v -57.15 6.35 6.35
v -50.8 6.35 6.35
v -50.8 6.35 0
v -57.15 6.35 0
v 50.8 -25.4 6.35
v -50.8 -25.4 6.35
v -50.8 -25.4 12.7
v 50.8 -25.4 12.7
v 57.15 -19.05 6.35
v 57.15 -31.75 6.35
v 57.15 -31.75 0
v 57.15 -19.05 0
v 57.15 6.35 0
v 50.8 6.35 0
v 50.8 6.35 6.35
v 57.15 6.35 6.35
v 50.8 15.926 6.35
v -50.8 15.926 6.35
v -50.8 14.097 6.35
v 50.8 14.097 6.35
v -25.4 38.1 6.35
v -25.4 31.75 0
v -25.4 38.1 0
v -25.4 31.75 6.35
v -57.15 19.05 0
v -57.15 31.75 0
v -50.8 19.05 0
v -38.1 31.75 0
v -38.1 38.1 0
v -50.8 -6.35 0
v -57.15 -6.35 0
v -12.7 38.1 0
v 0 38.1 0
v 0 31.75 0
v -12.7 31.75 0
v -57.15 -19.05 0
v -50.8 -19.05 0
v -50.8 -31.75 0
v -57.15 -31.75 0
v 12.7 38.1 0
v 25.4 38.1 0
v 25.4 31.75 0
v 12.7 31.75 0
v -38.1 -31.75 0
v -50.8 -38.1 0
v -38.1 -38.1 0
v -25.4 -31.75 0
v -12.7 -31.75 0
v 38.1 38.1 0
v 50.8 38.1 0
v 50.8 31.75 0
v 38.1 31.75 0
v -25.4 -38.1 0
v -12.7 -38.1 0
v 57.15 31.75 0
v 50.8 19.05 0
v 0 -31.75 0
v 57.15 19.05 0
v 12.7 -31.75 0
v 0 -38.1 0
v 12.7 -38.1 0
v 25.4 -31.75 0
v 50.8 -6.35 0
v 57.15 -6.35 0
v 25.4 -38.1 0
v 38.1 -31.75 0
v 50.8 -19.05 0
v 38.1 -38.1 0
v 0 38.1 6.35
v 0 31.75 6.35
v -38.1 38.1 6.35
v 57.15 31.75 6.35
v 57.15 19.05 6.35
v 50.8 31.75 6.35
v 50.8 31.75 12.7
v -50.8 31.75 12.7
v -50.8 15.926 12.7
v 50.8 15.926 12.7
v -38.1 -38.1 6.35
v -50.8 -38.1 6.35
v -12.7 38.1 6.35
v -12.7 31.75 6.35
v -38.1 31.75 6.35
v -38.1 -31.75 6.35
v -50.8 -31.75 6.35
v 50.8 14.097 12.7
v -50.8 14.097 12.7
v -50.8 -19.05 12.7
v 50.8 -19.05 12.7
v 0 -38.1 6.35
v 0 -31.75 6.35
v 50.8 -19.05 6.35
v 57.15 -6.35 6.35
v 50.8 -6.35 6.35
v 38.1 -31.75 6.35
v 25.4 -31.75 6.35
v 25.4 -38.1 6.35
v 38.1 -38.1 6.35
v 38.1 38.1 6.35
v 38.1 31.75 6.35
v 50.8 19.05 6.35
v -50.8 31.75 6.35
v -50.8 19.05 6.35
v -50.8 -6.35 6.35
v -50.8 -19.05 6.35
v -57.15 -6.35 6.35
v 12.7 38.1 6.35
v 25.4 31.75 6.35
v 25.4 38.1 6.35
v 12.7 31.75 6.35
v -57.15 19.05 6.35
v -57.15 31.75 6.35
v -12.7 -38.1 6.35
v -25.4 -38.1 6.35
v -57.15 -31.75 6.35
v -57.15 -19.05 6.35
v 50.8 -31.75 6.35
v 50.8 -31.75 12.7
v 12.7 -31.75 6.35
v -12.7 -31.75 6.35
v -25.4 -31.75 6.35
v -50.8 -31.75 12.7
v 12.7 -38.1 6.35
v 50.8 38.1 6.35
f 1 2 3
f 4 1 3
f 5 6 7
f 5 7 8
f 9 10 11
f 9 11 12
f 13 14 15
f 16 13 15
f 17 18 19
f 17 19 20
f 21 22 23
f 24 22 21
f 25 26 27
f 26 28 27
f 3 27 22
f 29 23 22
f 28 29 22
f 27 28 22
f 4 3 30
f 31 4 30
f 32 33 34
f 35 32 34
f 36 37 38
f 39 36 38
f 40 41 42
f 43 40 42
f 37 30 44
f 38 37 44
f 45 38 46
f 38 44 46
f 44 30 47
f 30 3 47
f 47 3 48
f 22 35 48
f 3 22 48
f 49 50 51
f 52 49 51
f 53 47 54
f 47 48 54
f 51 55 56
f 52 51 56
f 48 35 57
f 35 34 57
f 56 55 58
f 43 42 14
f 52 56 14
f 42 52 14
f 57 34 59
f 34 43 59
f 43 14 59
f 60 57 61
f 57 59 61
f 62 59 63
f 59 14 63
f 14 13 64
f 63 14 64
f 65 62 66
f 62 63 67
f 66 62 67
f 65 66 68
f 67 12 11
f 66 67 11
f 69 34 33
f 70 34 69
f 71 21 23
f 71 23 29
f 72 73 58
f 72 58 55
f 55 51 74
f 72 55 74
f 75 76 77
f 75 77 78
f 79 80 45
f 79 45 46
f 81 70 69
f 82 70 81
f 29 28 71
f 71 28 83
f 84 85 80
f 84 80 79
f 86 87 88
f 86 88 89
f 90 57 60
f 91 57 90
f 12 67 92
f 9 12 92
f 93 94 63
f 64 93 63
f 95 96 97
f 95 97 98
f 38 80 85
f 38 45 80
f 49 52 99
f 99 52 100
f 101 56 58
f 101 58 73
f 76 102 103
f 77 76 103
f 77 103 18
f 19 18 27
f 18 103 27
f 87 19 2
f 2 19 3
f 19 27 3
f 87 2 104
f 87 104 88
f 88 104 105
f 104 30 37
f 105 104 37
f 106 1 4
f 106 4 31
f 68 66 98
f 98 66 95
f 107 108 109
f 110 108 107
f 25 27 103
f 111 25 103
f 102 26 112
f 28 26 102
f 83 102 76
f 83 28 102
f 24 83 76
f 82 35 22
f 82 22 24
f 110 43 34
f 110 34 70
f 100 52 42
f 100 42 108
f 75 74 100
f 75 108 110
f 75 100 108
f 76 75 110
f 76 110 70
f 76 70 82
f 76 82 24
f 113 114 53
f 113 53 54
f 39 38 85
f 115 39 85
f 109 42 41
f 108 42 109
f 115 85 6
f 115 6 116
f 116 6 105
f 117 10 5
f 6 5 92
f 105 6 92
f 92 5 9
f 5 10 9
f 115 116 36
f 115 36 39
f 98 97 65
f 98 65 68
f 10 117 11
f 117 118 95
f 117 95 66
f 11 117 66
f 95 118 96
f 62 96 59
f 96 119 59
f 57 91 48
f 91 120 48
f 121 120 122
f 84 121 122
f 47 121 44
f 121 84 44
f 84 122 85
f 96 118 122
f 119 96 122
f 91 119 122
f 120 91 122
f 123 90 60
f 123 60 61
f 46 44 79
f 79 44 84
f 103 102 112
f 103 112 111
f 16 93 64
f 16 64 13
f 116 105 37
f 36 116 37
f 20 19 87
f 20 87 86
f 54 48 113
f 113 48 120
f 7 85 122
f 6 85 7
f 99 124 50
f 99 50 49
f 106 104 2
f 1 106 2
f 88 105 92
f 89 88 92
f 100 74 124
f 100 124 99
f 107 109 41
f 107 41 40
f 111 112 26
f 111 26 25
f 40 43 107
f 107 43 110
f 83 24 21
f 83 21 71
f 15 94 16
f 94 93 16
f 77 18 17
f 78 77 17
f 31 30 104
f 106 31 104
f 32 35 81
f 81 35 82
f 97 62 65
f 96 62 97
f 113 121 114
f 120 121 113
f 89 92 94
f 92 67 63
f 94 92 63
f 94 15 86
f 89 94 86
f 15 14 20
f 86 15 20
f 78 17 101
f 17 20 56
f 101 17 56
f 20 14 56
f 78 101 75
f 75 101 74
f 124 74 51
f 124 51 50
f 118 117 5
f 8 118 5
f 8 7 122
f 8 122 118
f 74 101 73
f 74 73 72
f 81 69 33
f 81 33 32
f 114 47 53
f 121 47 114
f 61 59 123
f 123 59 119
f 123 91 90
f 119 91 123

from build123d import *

# Parameters (mm, degrees)
F0_W      = 101.6
F0_H      = 63.5
F1_DEPTH  = 6.35
F2_W      = 101.6
F2_H      = 6.35
F3_DEPTH  = 6.35
F4_W      = 101.6
F4_H      = 20.32
F5_DEPTH  = 6.35
F6_W      = 101.6
F6_H      = 8.8265
F7_DEPTH  = 6.35
F8_W      = 12.7
F8_H      = 6.35
F9_DEPTH  = 6.35
F10_W     = 12.7
F10_H     = 6.35
F11_DEPTH = 6.35
F12_W     = 101.6
F12_H     = 6.9977
F13_DEPTH = 6.35
F14_W     = 12.7
F14_H     = 6.35
F15_DEPTH = 6.35
F16_W     = 12.7
F16_H     = 6.35
F17_DEPTH = 6.35
F19_DEPTH = 6.35


with BuildPart() as f1:
    # F0 (on Top) → F1 (new body)
    with BuildSketch(Plane.XY):
        Rectangle(F0_W, F0_H)
    extrude(amount=F1_DEPTH)

    # F2 (on face) → F3 (join)
    with BuildSketch(Plane.XY.offset(6.35)):
        with Locations((0, -28.575)):
            Rectangle(F2_W, F2_H)
    extrude(amount=F3_DEPTH)

    # F4 (on face) → F5 (join)
    with BuildSketch(Plane.XY.offset(6.35)):
        with Locations((0, 3.937)):
            Rectangle(F4_W, F4_H)
    extrude(amount=F5_DEPTH)

    # F6 (on face) → F7 (join)
    with BuildSketch(Plane.XY.offset(6.35)):
        with Locations((0, 27.33675)):
            Rectangle(F6_W, F6_H)
    extrude(amount=F7_DEPTH)

    # F8 (on face) → F9 (join)
    with BuildSketch(Plane.XZ.offset(31.75)):
        with Locations((-44.45, 3.175)):
            Rectangle(F8_W, F8_H)
        with Locations((-19.05, 3.175)):
            Rectangle(F8_W, F8_H)
        with Locations((6.35, 3.175)):
            Rectangle(F8_W, F8_H)
        with Locations((31.75, 3.175)):
            Rectangle(F8_W, F8_H)
    extrude(amount=F9_DEPTH)

    # F10 (on face) → F11 (join)
    with BuildSketch(Plane(origin=(0, 31.75, 0), x_dir=(-1, 0, 0), z_dir=(0, 1, 0))):
        with Locations((-44.45, 3.175)):
            Rectangle(F10_W, F10_H)
        with Locations((-19.05, 3.175)):
            Rectangle(F10_W, F10_H)
        with Locations((6.35, 3.175)):
            Rectangle(F10_W, F10_H)
        with Locations((31.75, 3.175)):
            Rectangle(F10_W, F10_H)
    extrude(amount=F11_DEPTH)

    # F12 (on face) → F13 (join)
    with BuildSketch(Plane.XY.offset(6.35)):
        with Locations((0, 19.42465)):
            Rectangle(F12_W, F12_H)
    extrude(amount=F13_DEPTH)

    # F14 (on face) → F15 (join)
    with BuildSketch(Plane.YZ.offset(50.8)):
        Polygon((-19.05, 0), (-19.05, 6.35), (-25.4, 6.35), (-31.75, 6.35), (-31.75, 0), align=None)
        Polygon((6.35, 6.35), (0, 6.35), (-6.223, 6.35), (-6.35, 6.35), (-6.35, 0), (6.35, 0), align=None)
        with Locations((25.4, 3.175)):
            Rectangle(F14_W, F14_H)
    extrude(amount=F15_DEPTH)

    # F16 (on face) → F17 (join)
    with BuildSketch(Plane(origin=(-50.8, 0, 0), x_dir=(0, -1, 0), z_dir=(-1, 0, 0))):
        with Locations((-25.4, 3.175)):
            Rectangle(F16_W, F16_H)
        Polygon((6.223, 6.35), (0, 6.35), (-6.35, 6.35), (-6.35, 0), (6.35, 0), (6.35, 6.35), align=None)
        Polygon((25.4, 6.35), (19.05, 6.35), (19.05, 0), (31.75, 0), (31.75, 6.35), align=None)
    extrude(amount=F17_DEPTH)

    # F18 (on face) → F19 (join)
    with BuildSketch(Plane.XY.offset(6.35)):
        Polygon((50.8, -6.223), (-50.8, -6.223), (-50.8, -6.35), (-50.8, -19.05), (50.8, -19.05), (50.8, -6.35), align=None)
    extrude(amount=F19_DEPTH)


solid = f1.part
